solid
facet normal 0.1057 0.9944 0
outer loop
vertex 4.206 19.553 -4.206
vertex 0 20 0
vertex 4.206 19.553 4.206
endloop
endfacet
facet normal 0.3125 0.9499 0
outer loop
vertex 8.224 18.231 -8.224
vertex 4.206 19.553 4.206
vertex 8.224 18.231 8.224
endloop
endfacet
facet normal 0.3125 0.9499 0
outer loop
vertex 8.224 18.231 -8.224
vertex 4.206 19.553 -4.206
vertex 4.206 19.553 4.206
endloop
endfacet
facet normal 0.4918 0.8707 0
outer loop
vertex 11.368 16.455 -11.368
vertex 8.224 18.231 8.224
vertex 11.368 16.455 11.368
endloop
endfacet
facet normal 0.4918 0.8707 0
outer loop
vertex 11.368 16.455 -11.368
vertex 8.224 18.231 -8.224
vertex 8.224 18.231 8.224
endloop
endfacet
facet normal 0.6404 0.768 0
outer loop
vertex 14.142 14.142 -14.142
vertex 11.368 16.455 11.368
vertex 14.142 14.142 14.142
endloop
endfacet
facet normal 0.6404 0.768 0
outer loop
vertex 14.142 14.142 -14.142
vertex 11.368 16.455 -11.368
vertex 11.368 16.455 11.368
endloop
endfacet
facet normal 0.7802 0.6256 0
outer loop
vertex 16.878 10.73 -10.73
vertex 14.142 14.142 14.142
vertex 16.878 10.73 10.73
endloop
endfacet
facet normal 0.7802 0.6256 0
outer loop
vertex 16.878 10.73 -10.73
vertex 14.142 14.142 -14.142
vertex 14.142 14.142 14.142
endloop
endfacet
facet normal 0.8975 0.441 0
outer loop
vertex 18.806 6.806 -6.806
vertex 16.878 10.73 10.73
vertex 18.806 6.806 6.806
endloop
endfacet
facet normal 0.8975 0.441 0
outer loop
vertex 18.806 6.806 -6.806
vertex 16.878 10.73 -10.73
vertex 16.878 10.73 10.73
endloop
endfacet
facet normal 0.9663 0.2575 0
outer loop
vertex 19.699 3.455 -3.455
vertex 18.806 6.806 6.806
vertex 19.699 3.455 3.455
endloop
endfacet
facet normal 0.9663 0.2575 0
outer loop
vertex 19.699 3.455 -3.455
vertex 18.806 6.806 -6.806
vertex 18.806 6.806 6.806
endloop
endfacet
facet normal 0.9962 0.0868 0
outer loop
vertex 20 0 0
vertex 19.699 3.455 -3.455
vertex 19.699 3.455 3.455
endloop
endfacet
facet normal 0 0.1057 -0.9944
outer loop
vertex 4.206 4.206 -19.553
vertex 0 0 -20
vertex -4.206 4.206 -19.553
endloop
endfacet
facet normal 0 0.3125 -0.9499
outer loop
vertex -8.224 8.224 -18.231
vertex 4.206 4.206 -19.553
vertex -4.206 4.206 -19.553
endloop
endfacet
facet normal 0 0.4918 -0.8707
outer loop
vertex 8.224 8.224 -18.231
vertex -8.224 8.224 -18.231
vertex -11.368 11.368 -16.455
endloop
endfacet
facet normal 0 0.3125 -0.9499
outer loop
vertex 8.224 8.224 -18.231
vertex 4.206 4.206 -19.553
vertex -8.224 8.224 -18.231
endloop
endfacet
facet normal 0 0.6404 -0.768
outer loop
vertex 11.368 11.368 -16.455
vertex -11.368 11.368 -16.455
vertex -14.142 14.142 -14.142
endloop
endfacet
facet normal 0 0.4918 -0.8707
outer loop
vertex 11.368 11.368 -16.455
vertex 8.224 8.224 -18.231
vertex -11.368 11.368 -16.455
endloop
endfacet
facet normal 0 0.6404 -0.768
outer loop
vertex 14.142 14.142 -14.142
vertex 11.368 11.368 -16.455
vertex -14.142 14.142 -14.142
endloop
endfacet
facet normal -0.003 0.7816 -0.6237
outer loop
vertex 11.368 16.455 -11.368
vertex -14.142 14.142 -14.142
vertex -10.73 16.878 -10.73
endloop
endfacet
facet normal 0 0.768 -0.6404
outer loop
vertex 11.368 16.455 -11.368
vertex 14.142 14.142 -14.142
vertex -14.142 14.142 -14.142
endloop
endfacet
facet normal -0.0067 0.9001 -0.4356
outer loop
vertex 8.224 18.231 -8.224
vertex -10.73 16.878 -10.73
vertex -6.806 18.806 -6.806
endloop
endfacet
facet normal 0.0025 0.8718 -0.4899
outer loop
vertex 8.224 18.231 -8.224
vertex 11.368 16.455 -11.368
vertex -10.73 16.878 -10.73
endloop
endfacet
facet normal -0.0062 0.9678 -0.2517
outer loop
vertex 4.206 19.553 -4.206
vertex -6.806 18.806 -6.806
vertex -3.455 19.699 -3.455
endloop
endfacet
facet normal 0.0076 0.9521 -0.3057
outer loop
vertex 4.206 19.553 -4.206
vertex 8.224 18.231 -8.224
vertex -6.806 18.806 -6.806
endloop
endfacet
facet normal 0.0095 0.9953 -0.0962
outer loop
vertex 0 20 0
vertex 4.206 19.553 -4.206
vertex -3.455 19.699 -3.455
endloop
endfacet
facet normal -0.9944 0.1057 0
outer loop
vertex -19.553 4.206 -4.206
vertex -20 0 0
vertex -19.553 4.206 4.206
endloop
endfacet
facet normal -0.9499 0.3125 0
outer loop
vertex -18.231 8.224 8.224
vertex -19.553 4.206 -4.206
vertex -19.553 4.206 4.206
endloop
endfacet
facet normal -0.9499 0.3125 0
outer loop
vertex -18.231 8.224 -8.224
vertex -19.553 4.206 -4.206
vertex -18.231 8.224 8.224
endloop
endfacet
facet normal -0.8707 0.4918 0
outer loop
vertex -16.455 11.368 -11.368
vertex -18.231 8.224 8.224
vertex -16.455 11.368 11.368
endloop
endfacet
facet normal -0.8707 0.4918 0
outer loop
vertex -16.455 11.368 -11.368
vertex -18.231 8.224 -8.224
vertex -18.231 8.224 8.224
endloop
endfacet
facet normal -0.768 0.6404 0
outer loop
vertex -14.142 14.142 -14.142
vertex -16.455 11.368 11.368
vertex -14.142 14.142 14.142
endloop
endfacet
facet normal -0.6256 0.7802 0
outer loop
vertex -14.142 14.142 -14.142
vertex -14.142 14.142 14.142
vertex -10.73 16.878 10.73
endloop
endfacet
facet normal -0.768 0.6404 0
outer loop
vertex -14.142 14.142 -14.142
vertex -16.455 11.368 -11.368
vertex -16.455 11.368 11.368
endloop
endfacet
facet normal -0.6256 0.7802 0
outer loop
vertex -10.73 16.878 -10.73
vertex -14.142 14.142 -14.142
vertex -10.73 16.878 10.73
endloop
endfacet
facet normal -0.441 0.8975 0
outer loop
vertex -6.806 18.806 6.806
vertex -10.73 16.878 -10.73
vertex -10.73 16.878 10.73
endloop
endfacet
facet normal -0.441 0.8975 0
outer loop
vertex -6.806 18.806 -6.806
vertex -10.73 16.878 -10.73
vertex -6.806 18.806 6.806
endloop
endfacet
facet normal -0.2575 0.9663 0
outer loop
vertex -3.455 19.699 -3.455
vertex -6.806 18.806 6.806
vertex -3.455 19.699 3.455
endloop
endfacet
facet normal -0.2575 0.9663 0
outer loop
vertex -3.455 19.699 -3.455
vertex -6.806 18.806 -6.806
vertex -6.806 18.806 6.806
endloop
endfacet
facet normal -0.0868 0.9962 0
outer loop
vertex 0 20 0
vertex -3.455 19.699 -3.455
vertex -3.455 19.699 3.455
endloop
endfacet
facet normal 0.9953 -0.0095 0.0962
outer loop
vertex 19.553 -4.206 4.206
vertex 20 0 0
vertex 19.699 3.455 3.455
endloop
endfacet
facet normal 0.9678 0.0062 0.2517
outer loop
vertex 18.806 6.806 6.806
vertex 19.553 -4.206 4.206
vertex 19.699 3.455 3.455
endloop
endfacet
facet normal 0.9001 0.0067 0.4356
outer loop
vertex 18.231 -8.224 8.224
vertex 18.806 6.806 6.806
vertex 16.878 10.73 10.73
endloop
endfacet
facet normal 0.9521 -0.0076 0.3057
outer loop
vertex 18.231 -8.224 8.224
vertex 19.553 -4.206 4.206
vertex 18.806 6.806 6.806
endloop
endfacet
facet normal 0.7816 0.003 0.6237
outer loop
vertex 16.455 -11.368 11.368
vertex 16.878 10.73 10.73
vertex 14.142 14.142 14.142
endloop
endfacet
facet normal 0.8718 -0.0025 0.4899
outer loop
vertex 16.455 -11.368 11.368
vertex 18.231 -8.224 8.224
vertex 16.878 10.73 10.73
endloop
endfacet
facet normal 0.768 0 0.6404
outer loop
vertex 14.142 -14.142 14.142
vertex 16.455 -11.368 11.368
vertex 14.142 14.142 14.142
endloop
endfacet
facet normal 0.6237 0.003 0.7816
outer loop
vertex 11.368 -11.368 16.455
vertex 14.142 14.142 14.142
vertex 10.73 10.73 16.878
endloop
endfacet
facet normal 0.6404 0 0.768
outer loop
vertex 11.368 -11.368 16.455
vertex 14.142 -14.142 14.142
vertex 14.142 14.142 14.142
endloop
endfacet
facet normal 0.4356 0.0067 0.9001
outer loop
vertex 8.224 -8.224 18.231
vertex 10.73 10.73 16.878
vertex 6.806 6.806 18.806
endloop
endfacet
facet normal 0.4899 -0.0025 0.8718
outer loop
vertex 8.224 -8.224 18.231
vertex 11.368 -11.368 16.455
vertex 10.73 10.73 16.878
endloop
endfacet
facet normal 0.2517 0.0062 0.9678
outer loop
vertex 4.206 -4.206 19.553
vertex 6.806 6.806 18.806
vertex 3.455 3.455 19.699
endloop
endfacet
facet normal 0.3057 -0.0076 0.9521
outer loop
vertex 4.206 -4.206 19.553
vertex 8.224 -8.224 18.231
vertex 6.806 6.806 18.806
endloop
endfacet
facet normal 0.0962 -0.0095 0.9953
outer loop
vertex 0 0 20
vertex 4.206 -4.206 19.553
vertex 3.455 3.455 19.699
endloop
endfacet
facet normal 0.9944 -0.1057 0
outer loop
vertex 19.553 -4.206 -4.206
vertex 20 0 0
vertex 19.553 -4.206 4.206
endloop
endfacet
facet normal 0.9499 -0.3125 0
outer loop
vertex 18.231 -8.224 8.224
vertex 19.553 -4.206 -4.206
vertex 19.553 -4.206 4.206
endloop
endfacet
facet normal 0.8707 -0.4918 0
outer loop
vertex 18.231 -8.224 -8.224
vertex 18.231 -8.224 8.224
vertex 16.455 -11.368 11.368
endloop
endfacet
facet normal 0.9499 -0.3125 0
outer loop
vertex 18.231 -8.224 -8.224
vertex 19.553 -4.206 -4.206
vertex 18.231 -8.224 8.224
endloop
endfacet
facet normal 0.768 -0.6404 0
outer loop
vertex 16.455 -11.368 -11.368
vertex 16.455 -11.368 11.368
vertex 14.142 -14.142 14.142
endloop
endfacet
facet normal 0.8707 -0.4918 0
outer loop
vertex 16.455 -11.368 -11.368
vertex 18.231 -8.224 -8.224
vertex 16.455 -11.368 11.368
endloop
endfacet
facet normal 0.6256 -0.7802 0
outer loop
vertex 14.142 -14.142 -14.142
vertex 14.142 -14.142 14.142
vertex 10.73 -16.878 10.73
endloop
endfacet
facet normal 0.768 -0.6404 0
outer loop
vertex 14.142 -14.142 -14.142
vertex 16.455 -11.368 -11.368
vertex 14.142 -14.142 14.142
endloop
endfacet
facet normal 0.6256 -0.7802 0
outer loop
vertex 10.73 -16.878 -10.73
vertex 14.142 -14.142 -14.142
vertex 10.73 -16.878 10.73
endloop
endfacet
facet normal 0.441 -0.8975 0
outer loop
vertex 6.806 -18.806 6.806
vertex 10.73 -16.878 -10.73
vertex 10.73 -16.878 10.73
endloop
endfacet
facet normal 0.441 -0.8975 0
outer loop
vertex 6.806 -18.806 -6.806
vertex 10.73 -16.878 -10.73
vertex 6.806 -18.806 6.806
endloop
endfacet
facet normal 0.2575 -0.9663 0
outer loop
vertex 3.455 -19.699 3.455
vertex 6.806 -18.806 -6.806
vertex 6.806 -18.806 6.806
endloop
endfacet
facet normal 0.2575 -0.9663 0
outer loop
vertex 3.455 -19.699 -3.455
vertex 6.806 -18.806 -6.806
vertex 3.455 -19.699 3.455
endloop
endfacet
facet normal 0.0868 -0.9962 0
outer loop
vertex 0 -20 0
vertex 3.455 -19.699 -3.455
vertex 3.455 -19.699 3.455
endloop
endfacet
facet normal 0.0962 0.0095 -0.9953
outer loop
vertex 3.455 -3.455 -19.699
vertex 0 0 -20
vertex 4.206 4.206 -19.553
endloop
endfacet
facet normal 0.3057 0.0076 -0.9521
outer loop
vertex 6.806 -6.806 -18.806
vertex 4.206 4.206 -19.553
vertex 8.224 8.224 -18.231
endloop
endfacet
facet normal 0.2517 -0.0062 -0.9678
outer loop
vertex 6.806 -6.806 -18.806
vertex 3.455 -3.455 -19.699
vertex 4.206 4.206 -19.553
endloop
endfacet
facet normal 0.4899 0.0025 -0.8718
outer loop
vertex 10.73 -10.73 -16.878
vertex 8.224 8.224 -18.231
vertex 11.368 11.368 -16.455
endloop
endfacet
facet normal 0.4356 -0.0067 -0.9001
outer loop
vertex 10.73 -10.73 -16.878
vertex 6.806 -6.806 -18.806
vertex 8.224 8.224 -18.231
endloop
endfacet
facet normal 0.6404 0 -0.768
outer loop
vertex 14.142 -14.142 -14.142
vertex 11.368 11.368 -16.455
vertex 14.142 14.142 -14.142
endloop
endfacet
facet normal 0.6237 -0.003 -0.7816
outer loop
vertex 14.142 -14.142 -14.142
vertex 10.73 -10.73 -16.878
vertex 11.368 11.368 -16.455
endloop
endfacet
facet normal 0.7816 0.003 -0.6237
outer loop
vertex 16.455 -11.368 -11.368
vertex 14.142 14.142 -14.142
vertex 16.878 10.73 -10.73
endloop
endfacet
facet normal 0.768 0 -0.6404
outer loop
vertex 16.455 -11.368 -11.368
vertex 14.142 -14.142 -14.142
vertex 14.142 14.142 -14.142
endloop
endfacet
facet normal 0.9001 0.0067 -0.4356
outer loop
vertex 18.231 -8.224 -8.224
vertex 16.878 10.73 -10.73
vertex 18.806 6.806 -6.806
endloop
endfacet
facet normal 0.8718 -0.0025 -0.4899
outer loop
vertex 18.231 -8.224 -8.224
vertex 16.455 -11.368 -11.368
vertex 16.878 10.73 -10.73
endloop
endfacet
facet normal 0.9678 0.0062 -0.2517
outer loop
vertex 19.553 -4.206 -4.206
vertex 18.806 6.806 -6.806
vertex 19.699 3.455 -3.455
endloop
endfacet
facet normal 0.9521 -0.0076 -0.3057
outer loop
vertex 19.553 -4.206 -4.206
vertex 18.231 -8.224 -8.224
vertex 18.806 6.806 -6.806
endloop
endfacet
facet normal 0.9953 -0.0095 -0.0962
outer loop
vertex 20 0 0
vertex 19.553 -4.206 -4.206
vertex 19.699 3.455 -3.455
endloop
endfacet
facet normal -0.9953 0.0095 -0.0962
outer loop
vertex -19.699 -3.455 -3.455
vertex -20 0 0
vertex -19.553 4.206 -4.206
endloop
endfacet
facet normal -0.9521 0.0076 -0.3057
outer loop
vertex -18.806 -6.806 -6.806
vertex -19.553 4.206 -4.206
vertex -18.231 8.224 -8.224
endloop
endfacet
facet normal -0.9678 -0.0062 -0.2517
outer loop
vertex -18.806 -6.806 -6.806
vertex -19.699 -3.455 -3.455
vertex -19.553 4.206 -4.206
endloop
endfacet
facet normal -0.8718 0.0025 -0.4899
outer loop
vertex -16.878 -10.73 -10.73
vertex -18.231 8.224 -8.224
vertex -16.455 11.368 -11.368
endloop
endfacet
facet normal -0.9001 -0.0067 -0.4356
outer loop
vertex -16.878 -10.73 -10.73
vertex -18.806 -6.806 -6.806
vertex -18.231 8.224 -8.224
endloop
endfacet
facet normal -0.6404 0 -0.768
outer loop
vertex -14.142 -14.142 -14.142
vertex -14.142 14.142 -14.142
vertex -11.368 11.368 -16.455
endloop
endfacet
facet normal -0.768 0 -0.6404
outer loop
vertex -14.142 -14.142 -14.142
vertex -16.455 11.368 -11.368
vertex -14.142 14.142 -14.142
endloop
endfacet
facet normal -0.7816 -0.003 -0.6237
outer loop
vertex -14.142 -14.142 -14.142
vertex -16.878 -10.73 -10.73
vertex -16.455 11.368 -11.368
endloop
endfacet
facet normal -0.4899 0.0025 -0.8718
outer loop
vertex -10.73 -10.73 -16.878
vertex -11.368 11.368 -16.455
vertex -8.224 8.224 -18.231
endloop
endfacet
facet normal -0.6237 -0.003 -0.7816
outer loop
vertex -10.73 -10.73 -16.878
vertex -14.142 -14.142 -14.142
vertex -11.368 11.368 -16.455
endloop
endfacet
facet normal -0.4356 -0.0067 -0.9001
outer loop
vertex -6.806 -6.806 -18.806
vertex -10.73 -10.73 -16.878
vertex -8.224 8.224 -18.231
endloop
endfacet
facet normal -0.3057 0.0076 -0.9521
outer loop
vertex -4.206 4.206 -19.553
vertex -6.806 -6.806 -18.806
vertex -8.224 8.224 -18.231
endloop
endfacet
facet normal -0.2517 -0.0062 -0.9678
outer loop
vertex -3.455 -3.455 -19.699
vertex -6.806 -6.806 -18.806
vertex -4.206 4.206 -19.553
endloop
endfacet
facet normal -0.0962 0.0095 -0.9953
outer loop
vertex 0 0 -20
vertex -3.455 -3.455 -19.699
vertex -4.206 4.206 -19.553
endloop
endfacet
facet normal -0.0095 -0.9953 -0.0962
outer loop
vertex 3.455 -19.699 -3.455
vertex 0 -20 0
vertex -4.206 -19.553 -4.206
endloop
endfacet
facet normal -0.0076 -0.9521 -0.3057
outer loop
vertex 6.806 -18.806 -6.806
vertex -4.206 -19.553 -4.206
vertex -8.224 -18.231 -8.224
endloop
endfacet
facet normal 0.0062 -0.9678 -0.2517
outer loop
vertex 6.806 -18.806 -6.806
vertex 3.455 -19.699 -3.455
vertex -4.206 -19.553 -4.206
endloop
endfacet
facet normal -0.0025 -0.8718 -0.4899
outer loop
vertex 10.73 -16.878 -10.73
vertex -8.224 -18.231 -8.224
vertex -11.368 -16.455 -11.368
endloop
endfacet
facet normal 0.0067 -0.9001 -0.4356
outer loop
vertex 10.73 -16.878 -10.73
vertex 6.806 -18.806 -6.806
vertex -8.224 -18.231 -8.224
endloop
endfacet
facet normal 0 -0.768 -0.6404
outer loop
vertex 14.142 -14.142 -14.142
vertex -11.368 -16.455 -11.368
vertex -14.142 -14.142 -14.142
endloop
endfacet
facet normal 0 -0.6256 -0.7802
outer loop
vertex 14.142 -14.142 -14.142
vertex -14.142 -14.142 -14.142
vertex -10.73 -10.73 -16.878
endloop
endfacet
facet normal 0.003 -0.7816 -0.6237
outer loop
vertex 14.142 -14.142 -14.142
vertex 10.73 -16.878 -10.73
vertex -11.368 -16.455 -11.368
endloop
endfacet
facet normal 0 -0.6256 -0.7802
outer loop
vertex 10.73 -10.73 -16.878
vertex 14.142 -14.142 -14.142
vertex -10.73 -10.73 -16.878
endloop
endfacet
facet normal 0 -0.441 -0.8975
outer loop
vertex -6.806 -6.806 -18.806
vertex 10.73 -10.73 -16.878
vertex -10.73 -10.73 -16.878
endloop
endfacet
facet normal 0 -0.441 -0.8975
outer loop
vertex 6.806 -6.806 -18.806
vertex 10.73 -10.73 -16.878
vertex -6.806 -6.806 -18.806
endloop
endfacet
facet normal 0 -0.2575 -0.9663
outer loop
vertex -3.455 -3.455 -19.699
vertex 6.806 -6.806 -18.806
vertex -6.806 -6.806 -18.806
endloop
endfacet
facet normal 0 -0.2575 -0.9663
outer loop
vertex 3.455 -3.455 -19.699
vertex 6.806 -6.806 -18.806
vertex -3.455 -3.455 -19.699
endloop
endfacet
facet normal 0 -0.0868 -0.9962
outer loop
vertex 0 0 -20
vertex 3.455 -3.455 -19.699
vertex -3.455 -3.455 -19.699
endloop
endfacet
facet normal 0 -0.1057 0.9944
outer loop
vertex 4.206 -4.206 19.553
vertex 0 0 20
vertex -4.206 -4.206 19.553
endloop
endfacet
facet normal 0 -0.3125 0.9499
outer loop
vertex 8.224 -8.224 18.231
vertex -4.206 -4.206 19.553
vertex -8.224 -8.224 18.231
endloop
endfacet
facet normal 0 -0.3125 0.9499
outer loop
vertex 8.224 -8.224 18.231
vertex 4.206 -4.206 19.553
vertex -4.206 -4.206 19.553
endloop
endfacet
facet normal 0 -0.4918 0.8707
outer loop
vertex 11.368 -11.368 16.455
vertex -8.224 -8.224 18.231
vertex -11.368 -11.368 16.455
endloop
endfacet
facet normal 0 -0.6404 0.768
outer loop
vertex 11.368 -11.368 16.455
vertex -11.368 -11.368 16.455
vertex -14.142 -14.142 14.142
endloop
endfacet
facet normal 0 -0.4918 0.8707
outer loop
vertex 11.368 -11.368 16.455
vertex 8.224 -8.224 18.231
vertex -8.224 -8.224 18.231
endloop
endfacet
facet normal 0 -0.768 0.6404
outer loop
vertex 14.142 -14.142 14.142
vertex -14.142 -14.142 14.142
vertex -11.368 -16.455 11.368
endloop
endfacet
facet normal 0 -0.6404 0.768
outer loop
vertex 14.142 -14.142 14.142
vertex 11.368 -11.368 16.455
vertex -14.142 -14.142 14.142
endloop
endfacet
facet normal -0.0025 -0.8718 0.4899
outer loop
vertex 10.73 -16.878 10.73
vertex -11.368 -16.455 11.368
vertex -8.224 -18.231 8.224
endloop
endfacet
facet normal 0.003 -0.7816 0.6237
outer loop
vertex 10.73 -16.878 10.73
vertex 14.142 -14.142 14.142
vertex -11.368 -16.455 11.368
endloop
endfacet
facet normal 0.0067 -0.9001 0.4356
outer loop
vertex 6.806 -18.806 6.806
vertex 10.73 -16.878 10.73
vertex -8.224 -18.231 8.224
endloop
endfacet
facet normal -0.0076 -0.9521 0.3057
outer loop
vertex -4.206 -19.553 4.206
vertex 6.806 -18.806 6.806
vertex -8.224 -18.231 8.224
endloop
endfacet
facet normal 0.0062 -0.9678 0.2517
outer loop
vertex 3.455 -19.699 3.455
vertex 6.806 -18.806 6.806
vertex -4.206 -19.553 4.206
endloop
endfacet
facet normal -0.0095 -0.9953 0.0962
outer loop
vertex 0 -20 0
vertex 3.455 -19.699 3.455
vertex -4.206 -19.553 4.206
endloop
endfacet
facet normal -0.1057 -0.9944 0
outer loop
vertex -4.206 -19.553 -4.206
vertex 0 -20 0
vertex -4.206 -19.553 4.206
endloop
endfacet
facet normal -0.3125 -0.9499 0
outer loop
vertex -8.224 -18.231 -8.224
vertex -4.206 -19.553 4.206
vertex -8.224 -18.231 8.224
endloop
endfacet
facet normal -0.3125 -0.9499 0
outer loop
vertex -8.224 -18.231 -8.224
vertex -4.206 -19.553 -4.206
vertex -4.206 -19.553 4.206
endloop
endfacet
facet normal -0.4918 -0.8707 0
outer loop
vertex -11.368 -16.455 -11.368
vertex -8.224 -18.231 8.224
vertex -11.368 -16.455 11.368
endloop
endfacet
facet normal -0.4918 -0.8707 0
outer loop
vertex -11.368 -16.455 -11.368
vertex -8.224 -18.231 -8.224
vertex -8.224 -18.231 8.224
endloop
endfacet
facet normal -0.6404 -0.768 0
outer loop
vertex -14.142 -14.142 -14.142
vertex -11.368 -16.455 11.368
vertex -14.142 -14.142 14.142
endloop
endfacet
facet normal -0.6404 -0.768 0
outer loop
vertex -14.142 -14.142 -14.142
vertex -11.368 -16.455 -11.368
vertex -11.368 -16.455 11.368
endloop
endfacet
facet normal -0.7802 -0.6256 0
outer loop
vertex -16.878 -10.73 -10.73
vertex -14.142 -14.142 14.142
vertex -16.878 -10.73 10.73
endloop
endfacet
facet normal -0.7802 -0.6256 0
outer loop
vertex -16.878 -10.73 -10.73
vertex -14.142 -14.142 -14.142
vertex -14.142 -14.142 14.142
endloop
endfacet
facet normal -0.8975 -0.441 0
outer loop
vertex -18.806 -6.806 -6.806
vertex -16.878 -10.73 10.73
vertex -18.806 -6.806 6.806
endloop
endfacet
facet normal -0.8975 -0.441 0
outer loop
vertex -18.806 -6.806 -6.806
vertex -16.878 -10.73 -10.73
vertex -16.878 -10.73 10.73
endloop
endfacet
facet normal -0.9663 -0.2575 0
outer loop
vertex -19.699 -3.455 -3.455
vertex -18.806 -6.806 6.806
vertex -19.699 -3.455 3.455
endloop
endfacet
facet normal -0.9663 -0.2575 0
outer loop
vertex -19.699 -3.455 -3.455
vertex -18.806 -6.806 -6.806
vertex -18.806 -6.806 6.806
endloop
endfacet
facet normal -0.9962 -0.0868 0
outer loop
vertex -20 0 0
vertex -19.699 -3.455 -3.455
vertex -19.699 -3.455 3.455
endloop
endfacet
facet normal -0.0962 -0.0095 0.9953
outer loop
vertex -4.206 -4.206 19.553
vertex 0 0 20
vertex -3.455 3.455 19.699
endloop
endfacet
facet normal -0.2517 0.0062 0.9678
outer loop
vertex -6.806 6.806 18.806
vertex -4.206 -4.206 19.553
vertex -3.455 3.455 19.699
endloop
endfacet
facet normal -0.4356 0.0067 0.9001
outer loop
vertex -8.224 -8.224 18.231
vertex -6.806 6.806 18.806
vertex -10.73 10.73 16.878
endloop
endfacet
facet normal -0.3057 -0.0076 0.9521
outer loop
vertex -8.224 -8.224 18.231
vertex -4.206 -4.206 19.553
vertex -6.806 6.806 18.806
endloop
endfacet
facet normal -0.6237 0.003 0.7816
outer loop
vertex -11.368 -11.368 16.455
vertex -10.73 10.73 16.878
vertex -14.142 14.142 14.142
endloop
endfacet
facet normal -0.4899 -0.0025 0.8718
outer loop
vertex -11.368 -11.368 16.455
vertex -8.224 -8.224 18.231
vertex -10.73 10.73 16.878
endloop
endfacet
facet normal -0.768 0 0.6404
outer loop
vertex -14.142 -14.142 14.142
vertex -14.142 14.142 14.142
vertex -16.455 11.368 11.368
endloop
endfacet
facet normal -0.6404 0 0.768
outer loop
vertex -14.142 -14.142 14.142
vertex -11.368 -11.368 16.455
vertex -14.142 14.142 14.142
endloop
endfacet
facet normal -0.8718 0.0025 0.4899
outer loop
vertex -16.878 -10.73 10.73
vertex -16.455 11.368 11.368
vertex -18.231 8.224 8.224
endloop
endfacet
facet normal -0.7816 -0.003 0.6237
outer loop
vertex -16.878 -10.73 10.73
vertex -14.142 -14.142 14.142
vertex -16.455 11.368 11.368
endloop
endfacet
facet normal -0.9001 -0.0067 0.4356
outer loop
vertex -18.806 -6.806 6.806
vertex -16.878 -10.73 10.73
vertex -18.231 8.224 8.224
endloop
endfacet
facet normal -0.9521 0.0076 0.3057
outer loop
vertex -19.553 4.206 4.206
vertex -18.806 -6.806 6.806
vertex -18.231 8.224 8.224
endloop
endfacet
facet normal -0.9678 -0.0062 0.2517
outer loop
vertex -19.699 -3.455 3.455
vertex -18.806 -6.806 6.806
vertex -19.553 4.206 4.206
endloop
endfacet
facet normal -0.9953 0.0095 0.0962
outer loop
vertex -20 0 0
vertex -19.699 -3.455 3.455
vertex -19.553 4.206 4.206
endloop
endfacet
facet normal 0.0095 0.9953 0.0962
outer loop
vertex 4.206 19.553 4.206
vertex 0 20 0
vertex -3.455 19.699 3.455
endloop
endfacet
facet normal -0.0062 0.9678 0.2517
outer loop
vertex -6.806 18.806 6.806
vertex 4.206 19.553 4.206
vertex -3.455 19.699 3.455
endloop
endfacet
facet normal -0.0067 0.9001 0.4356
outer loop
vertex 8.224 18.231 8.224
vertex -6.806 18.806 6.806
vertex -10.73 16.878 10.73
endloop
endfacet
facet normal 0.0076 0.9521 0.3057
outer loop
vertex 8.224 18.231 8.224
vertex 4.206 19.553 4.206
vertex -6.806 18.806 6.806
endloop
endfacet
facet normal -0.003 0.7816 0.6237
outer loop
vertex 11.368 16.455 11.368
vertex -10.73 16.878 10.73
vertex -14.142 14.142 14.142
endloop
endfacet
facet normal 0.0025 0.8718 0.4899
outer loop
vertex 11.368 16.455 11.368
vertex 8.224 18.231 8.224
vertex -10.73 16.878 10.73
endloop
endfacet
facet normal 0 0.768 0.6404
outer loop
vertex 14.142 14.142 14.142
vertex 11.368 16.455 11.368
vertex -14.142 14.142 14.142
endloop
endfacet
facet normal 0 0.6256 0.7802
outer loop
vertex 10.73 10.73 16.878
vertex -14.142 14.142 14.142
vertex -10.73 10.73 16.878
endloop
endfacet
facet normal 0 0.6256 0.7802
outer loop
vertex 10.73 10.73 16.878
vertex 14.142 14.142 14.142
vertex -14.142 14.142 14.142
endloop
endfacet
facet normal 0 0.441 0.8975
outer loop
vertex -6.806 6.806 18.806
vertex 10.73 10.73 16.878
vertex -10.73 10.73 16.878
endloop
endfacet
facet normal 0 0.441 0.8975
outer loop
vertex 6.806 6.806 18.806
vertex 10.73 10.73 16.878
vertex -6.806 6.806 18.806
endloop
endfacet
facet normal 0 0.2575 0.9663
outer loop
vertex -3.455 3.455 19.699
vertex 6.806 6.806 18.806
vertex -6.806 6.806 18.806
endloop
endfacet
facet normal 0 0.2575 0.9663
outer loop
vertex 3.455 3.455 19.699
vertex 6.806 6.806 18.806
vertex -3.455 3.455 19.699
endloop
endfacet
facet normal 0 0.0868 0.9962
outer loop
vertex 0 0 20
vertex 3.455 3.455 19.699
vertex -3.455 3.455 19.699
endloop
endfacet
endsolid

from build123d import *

# Parameters (mm, degrees)
F0_R     = 20
F1_DEPTH = 25
F4_COUNT = 3


with BuildPart() as f1:
    # F0 (on Front) → F1 (new body, symmetric)
    with BuildSketch(Plane.XZ):
        Circle(F0_R)
    extrude(amount=F1_DEPTH, both=True)


with BuildPart() as f4_1:
    # F4: instance of F1
    add(f1.part.rotate(Axis((-10, 10, 10), (-0.5773502692, 0.5773502692, 0.5773502692)), 1 * 360 / F4_COUNT))


with BuildPart() as f4_2:
    # F4: instance of F1
    add(f1.part.rotate(Axis((-10, 10, 10), (-0.5773502692, 0.5773502692, 0.5773502692)), 2 * 360 / F4_COUNT))

    # F5: intersect F4_1, F1
    add(f4_1.part, mode=Mode.INTERSECT)
    add(f1.part, mode=Mode.INTERSECT)


solid = f4_2.part
